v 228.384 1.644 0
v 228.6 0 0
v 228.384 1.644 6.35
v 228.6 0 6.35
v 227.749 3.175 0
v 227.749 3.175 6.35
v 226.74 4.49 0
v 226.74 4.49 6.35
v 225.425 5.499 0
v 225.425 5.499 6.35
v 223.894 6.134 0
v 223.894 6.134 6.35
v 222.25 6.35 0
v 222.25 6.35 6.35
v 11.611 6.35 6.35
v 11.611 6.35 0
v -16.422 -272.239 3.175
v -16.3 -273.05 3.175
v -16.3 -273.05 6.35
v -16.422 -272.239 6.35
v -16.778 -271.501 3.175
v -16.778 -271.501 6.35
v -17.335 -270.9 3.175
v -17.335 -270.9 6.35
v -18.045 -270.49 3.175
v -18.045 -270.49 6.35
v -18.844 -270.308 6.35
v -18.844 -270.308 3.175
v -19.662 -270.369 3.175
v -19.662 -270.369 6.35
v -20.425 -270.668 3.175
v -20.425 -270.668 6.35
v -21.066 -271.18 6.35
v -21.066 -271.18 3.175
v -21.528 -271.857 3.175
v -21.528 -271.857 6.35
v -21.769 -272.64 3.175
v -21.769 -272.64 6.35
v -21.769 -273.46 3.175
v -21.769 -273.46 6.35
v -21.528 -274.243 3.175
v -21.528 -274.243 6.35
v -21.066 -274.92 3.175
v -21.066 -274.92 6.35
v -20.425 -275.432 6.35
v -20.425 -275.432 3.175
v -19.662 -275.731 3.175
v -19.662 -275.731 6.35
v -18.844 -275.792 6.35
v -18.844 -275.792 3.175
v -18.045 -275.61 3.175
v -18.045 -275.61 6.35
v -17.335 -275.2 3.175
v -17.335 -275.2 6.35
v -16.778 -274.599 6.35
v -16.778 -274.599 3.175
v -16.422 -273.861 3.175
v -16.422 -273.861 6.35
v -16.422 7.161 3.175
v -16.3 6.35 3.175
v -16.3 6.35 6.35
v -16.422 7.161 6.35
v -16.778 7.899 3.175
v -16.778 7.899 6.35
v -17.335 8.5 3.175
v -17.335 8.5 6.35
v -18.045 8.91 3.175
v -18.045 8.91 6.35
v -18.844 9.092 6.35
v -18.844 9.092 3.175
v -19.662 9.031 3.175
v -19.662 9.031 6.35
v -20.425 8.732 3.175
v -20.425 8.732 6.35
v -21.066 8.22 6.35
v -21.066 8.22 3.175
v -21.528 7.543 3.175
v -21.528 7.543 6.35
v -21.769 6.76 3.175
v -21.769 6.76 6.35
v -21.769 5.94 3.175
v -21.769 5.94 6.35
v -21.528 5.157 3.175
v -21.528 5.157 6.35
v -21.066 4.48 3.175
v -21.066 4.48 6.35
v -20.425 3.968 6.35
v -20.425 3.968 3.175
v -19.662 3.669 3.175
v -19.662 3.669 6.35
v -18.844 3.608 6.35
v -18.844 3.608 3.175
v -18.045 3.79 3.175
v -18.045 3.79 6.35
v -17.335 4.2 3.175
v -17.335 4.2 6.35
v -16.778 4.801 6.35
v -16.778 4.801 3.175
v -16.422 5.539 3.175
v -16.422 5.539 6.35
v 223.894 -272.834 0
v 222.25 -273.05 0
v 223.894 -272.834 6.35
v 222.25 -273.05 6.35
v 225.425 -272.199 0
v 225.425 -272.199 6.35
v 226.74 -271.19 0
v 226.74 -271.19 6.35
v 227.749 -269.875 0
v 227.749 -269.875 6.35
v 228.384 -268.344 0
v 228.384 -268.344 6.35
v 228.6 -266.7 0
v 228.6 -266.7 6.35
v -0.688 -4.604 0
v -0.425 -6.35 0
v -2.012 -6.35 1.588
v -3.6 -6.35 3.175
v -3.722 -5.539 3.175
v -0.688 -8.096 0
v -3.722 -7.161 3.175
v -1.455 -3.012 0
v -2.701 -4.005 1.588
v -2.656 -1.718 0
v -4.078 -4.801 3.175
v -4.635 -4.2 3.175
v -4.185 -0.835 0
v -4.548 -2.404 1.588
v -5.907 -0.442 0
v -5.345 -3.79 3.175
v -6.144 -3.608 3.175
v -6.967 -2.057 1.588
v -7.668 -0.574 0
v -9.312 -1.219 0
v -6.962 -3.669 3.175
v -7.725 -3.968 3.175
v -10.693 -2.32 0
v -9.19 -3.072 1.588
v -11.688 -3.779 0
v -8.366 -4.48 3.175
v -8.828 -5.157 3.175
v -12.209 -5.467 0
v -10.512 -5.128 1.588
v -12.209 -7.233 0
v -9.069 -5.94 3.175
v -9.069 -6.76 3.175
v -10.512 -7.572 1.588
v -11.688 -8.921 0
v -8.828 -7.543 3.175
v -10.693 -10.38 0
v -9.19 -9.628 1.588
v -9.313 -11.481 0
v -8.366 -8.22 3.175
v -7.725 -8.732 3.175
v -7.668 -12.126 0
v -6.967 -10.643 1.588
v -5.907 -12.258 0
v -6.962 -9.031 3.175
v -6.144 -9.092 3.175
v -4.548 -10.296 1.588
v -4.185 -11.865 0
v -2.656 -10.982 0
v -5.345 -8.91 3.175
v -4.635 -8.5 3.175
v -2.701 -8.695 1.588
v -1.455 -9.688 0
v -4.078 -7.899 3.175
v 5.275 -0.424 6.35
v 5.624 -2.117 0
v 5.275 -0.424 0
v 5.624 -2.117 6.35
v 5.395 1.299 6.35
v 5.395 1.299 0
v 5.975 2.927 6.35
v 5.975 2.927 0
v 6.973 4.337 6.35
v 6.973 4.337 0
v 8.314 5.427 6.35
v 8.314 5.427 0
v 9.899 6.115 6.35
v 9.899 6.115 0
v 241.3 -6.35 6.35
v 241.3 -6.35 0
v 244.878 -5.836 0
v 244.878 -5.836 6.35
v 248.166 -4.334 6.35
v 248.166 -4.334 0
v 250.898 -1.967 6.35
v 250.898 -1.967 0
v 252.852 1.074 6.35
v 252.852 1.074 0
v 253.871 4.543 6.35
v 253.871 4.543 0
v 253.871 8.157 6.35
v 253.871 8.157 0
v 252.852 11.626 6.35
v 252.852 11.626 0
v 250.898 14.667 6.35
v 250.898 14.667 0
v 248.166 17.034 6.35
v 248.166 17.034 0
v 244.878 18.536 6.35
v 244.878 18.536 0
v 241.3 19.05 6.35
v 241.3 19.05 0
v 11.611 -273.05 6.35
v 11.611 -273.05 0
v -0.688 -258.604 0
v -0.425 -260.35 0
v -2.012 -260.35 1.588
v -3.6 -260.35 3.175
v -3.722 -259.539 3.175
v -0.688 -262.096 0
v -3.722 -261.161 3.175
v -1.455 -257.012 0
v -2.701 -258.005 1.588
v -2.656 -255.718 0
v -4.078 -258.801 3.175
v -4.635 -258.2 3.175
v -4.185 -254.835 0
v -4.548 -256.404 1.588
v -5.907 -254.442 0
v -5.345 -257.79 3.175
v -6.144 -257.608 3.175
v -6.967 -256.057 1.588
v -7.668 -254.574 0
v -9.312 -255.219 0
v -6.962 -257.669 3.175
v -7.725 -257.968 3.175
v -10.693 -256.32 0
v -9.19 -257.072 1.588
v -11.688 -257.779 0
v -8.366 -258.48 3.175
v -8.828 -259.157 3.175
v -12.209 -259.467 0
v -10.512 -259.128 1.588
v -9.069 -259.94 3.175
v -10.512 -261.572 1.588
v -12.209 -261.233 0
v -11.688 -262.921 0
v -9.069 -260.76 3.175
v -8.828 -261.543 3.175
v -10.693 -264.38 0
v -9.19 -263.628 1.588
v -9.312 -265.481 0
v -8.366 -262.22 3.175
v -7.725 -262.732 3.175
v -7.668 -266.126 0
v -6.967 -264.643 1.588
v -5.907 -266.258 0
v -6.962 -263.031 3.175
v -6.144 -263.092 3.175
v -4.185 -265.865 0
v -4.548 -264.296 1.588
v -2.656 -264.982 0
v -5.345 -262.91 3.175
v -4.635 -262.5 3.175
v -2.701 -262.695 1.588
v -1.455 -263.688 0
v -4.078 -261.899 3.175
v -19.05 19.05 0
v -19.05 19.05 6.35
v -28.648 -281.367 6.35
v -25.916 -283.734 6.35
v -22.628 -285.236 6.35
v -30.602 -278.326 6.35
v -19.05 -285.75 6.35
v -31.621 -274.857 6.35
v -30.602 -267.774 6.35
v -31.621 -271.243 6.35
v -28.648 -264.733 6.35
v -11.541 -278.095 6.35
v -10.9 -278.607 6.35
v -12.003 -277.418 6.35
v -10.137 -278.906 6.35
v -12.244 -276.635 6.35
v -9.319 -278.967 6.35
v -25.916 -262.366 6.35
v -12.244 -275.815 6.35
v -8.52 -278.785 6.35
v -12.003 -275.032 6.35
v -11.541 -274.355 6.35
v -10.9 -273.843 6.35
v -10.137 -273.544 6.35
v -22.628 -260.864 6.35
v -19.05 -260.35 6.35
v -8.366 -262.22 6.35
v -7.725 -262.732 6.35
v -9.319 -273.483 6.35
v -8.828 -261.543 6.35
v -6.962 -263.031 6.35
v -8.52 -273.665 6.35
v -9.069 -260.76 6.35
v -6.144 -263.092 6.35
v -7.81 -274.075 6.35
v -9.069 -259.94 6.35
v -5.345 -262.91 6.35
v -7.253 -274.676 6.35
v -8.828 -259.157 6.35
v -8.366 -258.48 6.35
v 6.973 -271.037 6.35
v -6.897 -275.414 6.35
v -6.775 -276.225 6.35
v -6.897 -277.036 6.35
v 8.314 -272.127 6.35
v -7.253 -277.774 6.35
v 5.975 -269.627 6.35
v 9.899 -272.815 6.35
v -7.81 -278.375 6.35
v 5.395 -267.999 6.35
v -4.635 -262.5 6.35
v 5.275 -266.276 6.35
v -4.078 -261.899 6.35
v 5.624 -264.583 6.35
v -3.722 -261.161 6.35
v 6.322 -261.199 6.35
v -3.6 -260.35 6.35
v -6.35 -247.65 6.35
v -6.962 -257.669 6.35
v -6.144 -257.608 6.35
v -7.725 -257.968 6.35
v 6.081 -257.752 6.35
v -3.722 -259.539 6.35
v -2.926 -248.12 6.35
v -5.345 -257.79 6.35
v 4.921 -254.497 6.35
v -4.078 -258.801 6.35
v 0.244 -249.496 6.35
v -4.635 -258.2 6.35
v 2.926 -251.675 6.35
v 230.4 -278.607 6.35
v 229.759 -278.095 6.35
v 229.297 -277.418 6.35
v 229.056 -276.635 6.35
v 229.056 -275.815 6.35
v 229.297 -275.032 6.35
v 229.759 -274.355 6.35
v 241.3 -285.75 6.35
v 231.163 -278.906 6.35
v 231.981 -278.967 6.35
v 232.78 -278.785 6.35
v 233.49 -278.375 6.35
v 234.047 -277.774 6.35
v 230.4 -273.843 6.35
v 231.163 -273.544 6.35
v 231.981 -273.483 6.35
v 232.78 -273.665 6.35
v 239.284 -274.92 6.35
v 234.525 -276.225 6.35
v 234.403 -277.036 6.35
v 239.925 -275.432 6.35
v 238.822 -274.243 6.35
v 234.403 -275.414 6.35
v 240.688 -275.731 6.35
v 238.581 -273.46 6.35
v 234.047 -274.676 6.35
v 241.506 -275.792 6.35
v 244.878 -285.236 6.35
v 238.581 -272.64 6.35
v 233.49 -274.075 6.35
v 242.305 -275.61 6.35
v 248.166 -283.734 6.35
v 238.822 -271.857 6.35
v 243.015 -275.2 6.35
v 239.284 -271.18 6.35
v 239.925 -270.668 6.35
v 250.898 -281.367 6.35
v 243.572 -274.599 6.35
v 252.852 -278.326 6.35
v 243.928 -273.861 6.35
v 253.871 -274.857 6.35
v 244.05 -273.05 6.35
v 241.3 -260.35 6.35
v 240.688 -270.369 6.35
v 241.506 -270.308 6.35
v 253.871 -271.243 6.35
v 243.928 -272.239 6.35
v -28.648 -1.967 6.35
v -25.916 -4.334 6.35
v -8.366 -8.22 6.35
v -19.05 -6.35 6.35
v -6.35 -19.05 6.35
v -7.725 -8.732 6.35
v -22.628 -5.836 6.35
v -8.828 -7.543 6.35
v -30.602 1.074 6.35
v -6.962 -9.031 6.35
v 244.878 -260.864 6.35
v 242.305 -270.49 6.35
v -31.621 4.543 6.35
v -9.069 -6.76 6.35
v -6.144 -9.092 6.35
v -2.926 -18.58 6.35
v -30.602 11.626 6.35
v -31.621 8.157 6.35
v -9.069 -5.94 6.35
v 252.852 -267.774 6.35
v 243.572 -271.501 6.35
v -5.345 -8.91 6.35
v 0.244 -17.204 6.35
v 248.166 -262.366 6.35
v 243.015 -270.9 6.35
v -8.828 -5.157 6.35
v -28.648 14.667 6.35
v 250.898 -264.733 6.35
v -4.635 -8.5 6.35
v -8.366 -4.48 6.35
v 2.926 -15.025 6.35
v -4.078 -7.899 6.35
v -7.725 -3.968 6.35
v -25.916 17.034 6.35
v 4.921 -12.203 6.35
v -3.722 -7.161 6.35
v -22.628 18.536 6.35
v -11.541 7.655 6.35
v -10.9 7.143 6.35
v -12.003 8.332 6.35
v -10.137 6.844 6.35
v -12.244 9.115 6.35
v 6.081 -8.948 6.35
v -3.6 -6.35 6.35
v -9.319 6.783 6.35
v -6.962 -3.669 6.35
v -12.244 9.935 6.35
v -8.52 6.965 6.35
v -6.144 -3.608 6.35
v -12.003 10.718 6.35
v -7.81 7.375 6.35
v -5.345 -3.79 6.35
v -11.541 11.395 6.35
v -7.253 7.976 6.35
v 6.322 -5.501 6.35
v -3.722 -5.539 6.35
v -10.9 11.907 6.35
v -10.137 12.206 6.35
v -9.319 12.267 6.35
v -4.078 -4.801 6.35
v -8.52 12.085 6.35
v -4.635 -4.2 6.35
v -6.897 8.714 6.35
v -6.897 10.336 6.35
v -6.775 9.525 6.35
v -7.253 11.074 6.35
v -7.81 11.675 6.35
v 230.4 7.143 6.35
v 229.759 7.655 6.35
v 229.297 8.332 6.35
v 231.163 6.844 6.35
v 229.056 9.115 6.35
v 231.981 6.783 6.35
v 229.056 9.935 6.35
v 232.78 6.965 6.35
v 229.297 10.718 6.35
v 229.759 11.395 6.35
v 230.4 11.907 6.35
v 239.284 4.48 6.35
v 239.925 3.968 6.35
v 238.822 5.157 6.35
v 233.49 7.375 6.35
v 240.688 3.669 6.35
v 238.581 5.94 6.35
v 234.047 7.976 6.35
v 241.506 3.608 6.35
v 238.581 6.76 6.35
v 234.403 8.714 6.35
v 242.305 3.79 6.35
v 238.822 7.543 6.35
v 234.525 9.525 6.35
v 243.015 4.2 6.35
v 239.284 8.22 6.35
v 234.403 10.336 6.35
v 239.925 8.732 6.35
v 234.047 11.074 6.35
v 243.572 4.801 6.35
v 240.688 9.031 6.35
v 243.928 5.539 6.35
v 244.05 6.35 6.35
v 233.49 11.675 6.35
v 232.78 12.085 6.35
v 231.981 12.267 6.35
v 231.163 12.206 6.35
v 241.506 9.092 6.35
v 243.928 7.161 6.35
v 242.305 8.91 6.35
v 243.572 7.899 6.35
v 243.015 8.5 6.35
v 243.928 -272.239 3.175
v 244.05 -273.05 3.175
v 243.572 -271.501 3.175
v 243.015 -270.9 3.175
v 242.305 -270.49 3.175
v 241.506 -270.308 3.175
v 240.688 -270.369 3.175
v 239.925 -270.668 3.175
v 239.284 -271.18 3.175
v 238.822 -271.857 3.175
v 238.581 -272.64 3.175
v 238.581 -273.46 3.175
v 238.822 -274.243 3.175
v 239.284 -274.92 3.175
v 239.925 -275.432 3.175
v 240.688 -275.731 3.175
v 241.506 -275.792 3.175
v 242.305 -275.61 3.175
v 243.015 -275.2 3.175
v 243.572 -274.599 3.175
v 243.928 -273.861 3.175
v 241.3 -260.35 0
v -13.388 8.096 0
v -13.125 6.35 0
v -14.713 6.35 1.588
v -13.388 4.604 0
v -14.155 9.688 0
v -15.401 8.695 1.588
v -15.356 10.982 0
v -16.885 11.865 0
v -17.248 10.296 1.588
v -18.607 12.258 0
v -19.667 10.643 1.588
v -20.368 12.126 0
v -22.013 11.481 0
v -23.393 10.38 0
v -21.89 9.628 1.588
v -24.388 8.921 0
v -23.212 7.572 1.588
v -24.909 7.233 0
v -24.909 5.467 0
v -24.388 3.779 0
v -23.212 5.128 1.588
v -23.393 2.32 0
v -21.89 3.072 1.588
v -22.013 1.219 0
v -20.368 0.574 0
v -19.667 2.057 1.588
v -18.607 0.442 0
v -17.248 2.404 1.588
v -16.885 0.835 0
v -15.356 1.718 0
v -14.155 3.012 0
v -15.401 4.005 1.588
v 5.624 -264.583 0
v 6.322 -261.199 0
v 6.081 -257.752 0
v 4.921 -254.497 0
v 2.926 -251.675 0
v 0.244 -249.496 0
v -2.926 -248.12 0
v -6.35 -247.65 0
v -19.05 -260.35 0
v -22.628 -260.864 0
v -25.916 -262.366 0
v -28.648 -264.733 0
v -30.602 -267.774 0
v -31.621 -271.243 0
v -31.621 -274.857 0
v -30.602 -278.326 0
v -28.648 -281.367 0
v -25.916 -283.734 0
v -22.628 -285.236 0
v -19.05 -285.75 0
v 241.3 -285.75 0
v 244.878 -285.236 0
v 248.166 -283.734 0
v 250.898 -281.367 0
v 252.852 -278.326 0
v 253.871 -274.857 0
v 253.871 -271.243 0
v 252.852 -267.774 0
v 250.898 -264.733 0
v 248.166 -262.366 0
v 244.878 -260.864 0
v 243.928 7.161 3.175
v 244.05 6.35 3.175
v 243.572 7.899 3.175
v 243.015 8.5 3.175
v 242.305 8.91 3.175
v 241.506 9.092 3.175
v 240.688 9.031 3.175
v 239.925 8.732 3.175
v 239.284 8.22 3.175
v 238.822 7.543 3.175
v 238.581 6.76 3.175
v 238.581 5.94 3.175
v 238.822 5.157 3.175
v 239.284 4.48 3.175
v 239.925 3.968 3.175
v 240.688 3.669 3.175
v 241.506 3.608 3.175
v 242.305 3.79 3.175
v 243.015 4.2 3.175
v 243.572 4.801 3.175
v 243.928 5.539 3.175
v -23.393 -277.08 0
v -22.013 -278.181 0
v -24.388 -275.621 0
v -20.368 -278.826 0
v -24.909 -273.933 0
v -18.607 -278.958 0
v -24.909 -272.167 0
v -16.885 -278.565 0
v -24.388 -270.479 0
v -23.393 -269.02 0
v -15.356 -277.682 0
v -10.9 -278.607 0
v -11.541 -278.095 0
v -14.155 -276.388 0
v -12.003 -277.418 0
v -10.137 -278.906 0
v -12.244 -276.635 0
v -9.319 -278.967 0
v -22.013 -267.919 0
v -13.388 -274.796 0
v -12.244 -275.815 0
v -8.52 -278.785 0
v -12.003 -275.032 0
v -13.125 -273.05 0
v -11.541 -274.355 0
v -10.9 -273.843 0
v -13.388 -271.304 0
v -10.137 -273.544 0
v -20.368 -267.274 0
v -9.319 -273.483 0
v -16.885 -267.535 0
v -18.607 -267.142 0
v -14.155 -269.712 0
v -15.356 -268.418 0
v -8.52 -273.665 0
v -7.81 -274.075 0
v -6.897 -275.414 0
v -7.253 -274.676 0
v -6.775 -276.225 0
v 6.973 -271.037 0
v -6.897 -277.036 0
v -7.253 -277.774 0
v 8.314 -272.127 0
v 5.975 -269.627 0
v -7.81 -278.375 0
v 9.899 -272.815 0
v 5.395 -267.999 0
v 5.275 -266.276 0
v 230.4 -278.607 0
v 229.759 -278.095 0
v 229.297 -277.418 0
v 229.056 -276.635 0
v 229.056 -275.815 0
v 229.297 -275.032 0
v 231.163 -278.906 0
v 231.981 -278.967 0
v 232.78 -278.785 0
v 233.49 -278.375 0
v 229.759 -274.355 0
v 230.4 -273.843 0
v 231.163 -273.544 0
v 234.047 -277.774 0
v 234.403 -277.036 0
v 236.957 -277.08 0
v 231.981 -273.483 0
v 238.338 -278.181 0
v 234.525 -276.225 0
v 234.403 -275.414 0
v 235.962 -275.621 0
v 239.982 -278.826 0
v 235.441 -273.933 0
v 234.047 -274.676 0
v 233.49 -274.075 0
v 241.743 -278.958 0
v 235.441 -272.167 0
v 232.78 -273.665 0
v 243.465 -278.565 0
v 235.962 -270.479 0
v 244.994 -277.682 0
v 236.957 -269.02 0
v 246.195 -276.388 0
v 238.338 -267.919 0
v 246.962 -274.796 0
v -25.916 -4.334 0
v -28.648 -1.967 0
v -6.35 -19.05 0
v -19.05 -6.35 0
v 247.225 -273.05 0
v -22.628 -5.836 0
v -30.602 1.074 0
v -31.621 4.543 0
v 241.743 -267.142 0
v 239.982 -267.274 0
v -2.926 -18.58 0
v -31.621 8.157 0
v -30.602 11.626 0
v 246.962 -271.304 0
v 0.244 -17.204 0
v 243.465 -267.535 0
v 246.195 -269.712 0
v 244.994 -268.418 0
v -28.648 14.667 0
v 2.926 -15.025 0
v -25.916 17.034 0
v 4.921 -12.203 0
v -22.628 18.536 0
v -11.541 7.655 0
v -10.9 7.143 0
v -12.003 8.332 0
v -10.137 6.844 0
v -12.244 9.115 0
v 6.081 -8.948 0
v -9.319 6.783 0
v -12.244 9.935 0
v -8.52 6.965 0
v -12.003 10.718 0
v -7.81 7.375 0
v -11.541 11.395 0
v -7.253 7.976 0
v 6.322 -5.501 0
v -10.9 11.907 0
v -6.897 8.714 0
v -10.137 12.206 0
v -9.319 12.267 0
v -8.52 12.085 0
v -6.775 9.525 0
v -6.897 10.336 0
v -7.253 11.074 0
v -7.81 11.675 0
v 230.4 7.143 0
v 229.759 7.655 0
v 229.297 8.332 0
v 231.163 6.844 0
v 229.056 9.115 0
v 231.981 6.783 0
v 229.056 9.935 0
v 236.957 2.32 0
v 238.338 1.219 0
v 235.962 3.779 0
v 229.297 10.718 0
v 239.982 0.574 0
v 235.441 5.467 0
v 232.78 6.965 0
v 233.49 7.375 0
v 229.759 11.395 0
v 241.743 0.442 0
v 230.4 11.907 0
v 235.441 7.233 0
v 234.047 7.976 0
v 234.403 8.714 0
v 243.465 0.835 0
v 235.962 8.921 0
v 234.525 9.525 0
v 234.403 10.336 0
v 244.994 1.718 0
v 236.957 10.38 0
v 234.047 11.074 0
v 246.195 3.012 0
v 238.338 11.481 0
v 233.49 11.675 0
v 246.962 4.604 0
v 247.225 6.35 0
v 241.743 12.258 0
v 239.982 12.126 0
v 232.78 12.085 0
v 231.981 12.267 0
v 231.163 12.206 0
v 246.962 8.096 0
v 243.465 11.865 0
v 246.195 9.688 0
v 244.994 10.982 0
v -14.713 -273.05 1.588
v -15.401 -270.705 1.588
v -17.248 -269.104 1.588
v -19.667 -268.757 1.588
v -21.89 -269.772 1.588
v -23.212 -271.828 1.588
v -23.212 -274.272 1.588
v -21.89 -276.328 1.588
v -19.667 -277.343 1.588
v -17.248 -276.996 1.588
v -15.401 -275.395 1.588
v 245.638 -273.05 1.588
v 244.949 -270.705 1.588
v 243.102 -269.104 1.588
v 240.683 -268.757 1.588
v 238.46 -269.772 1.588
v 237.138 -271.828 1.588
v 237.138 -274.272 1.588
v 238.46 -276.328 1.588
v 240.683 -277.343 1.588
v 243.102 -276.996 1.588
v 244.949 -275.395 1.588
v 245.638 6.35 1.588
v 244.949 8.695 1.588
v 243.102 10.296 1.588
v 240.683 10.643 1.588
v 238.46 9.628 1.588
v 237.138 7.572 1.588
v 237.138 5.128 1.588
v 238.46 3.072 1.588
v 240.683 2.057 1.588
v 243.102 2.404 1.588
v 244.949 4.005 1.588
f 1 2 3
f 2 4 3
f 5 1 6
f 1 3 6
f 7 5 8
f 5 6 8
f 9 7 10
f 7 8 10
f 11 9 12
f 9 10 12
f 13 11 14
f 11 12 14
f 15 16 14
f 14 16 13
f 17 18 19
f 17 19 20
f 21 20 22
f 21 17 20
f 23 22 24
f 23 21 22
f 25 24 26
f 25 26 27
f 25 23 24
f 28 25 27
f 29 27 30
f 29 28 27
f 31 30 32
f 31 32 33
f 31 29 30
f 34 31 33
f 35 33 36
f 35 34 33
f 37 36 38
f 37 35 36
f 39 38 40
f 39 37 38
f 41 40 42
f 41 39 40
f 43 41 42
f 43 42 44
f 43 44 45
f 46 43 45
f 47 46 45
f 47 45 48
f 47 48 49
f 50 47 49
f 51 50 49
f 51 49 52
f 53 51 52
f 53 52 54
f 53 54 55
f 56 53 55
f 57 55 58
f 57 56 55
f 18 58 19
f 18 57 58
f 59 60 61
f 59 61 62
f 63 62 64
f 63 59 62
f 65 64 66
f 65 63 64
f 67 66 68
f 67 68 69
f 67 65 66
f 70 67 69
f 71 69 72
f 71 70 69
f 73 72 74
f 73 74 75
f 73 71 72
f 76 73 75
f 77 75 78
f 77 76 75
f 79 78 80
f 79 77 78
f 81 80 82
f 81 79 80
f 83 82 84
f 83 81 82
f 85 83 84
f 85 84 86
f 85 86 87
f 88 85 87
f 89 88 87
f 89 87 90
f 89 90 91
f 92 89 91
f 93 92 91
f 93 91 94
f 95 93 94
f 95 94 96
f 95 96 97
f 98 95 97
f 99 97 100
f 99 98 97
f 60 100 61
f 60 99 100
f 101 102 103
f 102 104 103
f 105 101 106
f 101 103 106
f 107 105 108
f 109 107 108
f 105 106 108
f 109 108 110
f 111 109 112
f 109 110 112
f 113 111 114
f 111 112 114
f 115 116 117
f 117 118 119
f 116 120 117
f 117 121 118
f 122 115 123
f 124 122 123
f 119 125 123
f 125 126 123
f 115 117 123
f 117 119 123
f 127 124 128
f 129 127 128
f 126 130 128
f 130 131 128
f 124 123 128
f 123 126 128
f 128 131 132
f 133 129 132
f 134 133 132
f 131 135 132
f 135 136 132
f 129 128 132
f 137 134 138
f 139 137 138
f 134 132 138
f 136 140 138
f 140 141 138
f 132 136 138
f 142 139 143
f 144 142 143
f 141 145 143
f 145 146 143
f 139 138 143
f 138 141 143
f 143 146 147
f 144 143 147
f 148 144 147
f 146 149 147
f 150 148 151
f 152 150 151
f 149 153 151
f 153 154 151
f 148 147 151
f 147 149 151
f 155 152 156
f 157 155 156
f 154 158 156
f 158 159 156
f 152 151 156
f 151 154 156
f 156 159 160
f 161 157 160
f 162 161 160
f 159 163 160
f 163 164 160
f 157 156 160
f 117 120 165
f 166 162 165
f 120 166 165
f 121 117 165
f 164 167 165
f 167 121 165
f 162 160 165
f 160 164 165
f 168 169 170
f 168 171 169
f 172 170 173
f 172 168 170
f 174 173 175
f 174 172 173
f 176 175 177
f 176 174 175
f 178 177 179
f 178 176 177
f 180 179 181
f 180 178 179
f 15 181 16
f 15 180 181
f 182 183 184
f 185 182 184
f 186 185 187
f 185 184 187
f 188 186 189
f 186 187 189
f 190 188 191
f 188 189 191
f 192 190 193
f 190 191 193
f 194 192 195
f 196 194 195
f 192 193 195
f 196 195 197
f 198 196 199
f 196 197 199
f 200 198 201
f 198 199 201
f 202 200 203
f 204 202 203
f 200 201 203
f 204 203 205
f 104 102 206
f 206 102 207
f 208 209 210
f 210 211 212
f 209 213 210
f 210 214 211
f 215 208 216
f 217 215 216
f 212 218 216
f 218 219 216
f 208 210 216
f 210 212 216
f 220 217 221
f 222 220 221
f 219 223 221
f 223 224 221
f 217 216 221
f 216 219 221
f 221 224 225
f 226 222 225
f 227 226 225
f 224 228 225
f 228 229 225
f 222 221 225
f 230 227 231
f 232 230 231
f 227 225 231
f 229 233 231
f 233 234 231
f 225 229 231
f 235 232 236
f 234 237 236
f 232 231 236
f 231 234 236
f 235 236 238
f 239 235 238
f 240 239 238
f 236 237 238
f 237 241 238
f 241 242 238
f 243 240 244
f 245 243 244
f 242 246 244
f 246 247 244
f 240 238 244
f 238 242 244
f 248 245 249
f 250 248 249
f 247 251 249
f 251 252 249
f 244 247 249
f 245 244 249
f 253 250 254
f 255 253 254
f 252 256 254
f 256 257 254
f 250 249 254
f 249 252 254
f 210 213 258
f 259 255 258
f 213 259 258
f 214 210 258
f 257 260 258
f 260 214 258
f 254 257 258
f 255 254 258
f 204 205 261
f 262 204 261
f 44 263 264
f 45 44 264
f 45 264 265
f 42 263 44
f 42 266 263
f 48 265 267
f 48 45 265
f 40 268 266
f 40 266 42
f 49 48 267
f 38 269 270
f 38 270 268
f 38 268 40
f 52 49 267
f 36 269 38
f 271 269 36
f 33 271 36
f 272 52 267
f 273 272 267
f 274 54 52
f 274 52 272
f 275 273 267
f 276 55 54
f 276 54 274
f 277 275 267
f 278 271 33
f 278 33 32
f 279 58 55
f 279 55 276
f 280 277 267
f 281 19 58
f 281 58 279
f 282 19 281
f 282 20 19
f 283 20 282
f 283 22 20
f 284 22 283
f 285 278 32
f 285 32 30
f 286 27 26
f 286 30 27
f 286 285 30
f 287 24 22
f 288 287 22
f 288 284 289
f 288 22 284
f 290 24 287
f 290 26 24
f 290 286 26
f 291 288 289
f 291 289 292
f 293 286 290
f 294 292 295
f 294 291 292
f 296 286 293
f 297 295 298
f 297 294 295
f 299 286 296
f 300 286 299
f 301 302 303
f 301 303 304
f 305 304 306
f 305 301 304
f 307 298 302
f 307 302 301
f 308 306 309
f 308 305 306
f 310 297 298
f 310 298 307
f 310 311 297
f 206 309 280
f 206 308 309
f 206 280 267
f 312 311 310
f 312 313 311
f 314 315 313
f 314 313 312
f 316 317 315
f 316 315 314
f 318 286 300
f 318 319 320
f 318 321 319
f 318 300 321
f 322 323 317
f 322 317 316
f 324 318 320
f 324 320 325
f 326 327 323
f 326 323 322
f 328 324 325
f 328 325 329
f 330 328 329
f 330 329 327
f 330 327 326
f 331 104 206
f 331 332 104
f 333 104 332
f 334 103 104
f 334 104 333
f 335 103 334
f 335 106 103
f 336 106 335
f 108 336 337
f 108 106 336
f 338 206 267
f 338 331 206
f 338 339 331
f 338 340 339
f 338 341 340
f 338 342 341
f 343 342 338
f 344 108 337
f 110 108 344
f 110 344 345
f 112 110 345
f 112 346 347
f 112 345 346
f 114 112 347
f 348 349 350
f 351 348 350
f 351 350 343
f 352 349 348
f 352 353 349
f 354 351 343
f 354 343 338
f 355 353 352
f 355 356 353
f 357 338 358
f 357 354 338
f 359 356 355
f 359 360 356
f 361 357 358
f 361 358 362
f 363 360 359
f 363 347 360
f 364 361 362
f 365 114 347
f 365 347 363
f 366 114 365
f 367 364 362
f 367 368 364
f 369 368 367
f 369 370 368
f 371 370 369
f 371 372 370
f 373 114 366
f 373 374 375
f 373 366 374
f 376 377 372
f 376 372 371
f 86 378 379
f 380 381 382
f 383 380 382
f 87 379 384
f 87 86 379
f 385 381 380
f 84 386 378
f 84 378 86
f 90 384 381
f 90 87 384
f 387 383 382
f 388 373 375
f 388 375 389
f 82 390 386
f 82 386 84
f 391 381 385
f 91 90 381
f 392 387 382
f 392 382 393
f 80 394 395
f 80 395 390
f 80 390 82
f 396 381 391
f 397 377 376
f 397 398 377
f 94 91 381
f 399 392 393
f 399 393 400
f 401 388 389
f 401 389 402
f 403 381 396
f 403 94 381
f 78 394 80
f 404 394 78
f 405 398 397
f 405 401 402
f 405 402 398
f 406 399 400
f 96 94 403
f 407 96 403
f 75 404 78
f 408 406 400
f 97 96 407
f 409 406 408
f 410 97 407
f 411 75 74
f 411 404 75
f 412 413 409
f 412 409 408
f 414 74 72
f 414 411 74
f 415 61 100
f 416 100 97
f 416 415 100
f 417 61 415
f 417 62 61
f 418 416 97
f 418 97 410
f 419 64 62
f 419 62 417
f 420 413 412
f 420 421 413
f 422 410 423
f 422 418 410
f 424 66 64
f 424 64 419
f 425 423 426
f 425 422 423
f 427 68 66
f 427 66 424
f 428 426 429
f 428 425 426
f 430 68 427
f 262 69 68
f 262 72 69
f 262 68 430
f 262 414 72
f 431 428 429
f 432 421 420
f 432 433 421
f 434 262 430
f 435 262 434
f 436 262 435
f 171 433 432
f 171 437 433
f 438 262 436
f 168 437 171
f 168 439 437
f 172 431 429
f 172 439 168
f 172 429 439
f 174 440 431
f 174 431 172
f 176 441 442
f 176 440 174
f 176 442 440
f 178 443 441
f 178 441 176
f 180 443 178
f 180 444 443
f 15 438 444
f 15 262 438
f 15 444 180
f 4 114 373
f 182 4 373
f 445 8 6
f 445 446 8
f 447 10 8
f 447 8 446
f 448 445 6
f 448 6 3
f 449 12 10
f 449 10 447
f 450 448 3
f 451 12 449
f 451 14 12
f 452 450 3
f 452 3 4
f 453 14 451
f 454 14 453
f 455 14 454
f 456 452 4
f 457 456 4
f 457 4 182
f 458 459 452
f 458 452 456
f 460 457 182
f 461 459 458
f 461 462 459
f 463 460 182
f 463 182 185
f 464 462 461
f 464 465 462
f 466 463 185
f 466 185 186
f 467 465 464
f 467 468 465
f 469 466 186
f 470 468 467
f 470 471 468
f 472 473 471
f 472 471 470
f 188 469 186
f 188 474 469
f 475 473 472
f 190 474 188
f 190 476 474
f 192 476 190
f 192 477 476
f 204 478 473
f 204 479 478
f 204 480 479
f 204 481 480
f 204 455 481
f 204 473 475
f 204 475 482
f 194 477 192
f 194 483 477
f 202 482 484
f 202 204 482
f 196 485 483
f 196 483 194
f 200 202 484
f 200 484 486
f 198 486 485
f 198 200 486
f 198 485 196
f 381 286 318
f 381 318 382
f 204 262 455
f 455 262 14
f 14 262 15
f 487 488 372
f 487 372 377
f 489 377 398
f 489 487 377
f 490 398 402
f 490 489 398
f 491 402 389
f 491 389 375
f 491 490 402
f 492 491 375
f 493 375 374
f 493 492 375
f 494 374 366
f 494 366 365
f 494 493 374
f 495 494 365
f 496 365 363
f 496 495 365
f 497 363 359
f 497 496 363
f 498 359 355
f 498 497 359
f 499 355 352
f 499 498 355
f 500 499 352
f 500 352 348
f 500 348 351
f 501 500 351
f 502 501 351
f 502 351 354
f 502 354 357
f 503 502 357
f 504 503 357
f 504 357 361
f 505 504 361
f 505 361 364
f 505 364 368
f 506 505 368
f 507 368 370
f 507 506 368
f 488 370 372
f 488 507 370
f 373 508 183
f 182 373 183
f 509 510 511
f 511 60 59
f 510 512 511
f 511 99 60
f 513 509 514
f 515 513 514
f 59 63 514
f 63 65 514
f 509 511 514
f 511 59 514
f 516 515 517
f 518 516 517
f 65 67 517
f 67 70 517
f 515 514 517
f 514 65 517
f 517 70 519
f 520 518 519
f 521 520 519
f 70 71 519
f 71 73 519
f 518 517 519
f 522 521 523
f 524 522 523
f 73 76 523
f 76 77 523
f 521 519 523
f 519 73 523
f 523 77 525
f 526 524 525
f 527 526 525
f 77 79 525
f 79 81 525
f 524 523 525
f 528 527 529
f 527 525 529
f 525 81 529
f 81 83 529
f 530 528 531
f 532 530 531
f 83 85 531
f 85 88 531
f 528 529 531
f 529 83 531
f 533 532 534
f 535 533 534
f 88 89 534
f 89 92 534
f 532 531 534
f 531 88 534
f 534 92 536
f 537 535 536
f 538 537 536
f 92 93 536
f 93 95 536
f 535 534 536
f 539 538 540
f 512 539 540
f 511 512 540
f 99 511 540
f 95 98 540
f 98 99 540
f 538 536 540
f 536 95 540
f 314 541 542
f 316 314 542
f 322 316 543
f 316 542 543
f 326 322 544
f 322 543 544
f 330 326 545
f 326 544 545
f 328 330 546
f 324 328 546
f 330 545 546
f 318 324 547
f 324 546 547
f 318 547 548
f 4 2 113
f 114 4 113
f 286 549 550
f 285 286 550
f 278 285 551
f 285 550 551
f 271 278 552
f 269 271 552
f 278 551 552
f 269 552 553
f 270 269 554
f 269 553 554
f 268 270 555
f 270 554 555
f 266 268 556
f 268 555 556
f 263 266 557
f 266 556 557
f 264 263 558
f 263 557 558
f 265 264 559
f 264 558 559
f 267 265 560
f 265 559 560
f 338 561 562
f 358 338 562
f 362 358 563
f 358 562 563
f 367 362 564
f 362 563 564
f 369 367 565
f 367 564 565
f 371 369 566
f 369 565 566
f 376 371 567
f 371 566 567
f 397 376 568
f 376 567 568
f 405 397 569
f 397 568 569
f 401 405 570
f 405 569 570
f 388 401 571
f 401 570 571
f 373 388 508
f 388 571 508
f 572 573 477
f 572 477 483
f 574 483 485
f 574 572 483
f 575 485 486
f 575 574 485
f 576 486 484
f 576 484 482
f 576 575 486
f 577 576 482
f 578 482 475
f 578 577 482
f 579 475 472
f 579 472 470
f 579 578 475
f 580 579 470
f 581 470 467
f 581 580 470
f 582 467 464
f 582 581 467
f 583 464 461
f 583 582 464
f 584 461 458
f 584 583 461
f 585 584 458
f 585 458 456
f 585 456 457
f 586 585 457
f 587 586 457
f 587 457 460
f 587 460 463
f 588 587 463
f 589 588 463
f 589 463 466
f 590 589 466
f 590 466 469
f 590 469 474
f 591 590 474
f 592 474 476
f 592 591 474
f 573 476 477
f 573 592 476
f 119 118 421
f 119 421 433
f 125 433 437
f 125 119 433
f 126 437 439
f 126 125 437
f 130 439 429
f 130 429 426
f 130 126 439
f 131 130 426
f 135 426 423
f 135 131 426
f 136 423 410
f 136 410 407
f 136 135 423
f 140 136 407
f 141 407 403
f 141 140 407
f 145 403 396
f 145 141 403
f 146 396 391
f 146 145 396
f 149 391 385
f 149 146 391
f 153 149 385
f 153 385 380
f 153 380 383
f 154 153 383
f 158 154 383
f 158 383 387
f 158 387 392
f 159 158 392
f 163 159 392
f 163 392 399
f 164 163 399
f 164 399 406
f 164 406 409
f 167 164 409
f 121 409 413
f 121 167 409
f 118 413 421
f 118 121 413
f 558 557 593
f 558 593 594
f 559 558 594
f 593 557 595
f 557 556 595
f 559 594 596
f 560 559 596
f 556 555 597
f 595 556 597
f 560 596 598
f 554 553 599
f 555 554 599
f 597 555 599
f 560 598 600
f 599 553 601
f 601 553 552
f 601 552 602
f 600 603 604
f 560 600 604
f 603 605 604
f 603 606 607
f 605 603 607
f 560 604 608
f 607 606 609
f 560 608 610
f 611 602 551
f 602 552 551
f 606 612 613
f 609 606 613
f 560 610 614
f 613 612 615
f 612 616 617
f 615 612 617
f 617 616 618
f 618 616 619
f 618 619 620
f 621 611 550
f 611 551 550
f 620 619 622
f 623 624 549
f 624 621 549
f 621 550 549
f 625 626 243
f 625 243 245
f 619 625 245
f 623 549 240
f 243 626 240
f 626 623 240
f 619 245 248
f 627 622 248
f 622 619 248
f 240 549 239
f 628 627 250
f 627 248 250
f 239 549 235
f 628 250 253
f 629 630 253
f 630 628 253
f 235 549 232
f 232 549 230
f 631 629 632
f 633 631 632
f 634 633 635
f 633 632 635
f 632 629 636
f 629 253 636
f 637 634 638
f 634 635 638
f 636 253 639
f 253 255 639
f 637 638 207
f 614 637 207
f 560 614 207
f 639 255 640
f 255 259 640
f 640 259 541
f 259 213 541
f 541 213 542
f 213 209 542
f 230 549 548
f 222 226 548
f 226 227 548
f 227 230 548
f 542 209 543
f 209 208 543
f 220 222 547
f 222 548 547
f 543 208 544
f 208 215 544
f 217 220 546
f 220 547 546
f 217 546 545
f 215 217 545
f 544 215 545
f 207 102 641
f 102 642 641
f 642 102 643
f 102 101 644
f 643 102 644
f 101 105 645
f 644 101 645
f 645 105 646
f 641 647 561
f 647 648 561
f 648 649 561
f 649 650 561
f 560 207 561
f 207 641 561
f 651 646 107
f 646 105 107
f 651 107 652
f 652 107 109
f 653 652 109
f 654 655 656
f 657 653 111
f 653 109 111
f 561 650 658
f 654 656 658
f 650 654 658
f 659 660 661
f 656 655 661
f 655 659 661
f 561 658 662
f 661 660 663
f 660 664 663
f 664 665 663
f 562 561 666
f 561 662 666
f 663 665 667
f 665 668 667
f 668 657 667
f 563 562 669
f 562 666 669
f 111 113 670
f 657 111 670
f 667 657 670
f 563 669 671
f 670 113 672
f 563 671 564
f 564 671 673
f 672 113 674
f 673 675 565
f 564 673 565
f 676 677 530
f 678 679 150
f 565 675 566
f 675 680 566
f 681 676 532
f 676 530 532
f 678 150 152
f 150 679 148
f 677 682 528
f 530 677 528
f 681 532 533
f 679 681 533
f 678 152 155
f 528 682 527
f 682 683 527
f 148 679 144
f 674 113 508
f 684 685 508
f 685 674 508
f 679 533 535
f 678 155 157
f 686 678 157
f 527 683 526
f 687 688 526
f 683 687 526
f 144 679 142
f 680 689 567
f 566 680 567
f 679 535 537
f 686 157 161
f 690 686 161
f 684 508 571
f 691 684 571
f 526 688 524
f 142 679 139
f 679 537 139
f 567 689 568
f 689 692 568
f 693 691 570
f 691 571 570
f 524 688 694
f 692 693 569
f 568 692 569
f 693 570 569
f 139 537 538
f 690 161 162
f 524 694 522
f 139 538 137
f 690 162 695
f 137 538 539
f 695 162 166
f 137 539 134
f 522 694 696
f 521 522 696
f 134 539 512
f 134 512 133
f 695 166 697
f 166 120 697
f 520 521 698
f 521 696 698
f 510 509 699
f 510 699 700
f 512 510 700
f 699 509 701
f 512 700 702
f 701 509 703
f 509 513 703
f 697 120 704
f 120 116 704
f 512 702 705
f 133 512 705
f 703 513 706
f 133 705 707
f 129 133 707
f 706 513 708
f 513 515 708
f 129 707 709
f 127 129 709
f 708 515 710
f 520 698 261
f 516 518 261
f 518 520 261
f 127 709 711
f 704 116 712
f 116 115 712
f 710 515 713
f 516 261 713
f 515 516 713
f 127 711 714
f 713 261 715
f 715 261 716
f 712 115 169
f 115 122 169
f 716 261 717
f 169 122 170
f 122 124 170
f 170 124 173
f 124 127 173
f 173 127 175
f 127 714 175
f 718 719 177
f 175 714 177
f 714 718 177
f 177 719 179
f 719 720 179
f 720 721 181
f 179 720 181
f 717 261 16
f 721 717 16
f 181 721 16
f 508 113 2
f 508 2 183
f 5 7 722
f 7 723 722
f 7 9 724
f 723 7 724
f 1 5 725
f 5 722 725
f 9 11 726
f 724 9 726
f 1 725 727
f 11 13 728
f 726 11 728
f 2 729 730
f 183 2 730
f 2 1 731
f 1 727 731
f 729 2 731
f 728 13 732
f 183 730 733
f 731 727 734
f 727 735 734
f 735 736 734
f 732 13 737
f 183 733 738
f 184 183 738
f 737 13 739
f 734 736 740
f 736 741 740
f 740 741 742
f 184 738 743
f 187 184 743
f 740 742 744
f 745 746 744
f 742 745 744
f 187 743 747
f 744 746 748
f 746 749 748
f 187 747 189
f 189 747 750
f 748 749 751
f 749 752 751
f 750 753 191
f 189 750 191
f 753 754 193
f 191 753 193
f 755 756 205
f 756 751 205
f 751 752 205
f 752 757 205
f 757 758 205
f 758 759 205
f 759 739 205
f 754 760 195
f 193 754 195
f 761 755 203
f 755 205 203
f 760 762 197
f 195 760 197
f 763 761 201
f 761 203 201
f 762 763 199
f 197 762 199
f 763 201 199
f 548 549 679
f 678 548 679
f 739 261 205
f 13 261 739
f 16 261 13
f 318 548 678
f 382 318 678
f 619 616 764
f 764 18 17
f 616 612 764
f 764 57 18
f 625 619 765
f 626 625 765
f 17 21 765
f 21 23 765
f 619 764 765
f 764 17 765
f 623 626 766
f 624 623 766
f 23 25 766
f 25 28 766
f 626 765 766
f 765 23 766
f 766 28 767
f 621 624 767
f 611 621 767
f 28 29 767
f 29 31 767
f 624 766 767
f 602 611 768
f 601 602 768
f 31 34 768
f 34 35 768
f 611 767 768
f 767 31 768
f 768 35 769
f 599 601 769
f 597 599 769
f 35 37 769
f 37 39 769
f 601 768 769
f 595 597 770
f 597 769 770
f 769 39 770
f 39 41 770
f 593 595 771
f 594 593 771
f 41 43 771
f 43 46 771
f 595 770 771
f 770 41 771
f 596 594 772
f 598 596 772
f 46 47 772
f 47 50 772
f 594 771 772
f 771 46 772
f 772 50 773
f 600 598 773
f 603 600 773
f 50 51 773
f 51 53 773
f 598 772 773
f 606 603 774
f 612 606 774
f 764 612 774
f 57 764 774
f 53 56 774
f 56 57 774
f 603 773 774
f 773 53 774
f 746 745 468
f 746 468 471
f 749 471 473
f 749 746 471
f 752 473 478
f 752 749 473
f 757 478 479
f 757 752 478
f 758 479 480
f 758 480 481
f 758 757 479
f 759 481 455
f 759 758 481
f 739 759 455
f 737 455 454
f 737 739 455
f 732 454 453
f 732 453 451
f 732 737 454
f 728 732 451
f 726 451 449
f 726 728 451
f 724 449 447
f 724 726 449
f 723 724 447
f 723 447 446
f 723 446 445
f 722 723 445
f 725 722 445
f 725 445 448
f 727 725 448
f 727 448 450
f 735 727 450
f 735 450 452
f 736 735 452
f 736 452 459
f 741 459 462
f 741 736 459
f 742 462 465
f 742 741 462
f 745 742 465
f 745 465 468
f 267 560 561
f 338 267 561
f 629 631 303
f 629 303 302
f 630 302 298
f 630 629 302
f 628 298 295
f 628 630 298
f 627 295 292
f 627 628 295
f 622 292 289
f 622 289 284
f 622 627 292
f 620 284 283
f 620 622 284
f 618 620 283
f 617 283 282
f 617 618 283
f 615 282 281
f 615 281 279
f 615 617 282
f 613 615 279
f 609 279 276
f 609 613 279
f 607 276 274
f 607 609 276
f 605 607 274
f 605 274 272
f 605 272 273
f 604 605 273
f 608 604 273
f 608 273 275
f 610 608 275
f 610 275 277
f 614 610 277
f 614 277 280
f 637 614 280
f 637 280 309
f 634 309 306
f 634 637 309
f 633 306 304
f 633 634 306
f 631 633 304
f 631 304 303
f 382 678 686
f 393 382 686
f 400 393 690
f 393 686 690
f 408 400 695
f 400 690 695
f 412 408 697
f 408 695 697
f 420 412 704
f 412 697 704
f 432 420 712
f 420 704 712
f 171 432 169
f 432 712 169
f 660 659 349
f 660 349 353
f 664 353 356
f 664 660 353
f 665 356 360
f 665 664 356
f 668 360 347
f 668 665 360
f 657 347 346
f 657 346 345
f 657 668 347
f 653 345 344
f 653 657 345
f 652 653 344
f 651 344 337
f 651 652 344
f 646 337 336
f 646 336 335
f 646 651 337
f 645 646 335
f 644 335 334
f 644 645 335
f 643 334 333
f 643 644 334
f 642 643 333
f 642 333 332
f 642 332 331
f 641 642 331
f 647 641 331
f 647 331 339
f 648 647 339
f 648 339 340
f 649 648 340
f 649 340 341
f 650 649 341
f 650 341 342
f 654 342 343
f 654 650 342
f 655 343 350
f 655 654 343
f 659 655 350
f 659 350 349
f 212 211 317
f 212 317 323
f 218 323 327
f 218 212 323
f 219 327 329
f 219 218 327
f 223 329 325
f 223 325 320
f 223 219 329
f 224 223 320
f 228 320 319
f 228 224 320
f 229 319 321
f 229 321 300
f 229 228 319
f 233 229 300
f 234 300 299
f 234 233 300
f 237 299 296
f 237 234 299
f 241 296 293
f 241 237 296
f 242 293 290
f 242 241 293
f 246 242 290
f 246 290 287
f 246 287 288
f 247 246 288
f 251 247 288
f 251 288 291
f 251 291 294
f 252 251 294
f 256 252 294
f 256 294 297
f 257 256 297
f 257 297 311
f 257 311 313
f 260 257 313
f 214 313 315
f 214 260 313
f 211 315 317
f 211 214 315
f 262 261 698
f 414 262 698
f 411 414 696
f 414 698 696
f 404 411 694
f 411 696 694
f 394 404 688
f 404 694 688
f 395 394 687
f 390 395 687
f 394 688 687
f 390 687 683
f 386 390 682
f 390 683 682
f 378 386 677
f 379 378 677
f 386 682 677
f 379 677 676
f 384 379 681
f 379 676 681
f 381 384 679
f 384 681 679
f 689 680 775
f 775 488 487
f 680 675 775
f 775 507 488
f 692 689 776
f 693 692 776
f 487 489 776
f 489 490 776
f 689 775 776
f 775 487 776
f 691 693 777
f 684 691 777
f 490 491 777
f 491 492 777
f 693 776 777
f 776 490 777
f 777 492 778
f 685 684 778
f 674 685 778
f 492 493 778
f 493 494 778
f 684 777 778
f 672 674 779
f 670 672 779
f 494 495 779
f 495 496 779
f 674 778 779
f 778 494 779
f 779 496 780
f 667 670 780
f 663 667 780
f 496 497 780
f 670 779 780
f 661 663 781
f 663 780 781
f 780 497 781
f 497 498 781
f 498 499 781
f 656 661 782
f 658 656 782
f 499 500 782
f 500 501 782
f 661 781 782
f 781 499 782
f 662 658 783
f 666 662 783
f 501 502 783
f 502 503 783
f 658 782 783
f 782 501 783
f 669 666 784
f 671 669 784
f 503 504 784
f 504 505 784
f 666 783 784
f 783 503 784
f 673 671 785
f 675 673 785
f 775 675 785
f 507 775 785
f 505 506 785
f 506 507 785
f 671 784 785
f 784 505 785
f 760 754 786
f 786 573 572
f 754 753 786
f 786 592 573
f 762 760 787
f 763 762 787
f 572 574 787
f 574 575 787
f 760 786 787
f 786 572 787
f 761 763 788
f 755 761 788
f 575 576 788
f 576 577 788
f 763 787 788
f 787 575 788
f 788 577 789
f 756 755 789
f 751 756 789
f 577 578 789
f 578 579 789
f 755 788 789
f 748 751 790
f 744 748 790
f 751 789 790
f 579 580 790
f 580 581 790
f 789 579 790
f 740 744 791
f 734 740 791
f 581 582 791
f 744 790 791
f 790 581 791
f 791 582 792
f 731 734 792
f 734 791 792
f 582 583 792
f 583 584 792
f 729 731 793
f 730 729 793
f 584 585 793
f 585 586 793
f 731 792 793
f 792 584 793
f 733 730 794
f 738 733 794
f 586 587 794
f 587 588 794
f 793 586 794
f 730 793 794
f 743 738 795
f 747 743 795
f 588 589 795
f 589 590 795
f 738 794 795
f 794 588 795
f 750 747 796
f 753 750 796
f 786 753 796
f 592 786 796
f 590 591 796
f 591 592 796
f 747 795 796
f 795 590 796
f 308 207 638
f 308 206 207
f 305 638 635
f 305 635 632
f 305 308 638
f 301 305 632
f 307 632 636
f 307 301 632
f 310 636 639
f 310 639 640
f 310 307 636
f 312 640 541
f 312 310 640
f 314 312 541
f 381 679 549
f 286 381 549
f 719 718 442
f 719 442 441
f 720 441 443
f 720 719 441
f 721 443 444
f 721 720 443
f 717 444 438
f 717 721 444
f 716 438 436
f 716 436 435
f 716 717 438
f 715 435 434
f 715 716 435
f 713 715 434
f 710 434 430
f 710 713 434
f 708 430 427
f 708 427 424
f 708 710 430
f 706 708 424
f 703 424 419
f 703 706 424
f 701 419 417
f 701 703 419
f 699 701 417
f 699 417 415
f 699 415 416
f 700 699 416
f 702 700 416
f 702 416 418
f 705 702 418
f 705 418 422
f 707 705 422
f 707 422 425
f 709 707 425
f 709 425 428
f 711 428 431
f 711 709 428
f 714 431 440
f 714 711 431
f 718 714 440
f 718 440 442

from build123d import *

# Parameters (mm, degrees)
SKETCH1_R           = 2.75
BOSS_EXTRUDE1_DEPTH = 6.35
FILLET1_R           = 6.35
CHAMFER1_SIZE       = 3.175


with BuildPart() as part:
    # Sketch1 → Boss-Extrude1 (new body)
    with BuildSketch(Plane.XY):
        with BuildLine():
            ThreePointArc((-19.05, 19.05), (-31.75, 6.35), (-19.05, -6.35))
            Line((-19.05, -6.35), (-19.05, -260.35))
            ThreePointArc((-19.05, -260.35), (-31.75, -273.05), (-19.05, -285.75))
            Line((-19.05, -285.75), (241.3, -285.75))
            ThreePointArc((241.3, -285.75), (254, -273.05), (241.3, -260.35))
            Line((241.3, -260.35), (241.3, -6.35))
            ThreePointArc((241.3, -6.35), (254, 6.35), (241.3, 19.05))
            Line((241.3, 19.05), (-19.05, 19.05))
        make_face()
        with Locations((241.3, 6.35)):
            Circle(SKETCH1_R, mode=Mode.SUBTRACT)
        with Locations((-19.05, -273.05)):
            Circle(SKETCH1_R, mode=Mode.SUBTRACT)
        with Locations((-9.525, -276.225)):
            Circle(SKETCH1_R, mode=Mode.SUBTRACT)
        with Locations((231.775, -276.225)):
            Circle(SKETCH1_R, mode=Mode.SUBTRACT)
        with Locations((241.3, -273.05)):
            Circle(SKETCH1_R, mode=Mode.SUBTRACT)
        with BuildLine():
            Line((-6.35, -247.65), (-6.35, -19.05))
            ThreePointArc((-6.35, -19.05), (6.35, -6.35), (-6.35, 6.35))
            Line((-6.35, 6.35), (228.6, 6.35))
            Line((228.6, 6.35), (228.6, -273.05))
            Line((228.6, -273.05), (-6.35, -273.05))
            ThreePointArc((-6.35, -273.05), (6.35, -260.35), (-6.35, -247.65))
        make_face(mode=Mode.SUBTRACT)
        with Locations((-6.35, -6.35)):
            Circle(SKETCH1_R, mode=Mode.SUBTRACT)
        with Locations((-6.35, -260.35)):
            Circle(SKETCH1_R, mode=Mode.SUBTRACT)
        with Locations((-19.05, 6.35)):
            Circle(SKETCH1_R, mode=Mode.SUBTRACT)
        with Locations((-9.525, 9.525)):
            Circle(SKETCH1_R, mode=Mode.SUBTRACT)
        with Locations((231.775, 9.525)):
            Circle(SKETCH1_R, mode=Mode.SUBTRACT)
    extrude(amount=BOSS_EXTRUDE1_DEPTH)

    # Fillet1
    fillet1_edges = [part.edges().sort_by_distance(p)[0] for p in [
        (228.6, -273.05, 3.175),
        (228.6, 6.35, 3.175),
        (-6.35, 6.35, 3.175),
    ]]
    fillet(fillet1_edges, radius=FILLET1_R)
    fillet1_2_edges = [part.edges().sort_by_distance(p)[0] for p in [
        (-6.35, -273.05, 3.175),
    ]]
    fillet(fillet1_2_edges, radius=FILLET1_R)

    # Chamfer1
    chamfer1_edges = [part.edges().sort_by_distance(p)[0] for p in [
        (-21.8, 6.35, 0),
        (-21.8, -273.05, 0),
        (238.55, 6.35, 0),
        (238.55, -273.05, 0),
        (-9.1, -260.35, 0),
        (-9.1, -6.35, 0),
    ]]
    chamfer(chamfer1_edges, length=CHAMFER1_SIZE)


solid = part.part
